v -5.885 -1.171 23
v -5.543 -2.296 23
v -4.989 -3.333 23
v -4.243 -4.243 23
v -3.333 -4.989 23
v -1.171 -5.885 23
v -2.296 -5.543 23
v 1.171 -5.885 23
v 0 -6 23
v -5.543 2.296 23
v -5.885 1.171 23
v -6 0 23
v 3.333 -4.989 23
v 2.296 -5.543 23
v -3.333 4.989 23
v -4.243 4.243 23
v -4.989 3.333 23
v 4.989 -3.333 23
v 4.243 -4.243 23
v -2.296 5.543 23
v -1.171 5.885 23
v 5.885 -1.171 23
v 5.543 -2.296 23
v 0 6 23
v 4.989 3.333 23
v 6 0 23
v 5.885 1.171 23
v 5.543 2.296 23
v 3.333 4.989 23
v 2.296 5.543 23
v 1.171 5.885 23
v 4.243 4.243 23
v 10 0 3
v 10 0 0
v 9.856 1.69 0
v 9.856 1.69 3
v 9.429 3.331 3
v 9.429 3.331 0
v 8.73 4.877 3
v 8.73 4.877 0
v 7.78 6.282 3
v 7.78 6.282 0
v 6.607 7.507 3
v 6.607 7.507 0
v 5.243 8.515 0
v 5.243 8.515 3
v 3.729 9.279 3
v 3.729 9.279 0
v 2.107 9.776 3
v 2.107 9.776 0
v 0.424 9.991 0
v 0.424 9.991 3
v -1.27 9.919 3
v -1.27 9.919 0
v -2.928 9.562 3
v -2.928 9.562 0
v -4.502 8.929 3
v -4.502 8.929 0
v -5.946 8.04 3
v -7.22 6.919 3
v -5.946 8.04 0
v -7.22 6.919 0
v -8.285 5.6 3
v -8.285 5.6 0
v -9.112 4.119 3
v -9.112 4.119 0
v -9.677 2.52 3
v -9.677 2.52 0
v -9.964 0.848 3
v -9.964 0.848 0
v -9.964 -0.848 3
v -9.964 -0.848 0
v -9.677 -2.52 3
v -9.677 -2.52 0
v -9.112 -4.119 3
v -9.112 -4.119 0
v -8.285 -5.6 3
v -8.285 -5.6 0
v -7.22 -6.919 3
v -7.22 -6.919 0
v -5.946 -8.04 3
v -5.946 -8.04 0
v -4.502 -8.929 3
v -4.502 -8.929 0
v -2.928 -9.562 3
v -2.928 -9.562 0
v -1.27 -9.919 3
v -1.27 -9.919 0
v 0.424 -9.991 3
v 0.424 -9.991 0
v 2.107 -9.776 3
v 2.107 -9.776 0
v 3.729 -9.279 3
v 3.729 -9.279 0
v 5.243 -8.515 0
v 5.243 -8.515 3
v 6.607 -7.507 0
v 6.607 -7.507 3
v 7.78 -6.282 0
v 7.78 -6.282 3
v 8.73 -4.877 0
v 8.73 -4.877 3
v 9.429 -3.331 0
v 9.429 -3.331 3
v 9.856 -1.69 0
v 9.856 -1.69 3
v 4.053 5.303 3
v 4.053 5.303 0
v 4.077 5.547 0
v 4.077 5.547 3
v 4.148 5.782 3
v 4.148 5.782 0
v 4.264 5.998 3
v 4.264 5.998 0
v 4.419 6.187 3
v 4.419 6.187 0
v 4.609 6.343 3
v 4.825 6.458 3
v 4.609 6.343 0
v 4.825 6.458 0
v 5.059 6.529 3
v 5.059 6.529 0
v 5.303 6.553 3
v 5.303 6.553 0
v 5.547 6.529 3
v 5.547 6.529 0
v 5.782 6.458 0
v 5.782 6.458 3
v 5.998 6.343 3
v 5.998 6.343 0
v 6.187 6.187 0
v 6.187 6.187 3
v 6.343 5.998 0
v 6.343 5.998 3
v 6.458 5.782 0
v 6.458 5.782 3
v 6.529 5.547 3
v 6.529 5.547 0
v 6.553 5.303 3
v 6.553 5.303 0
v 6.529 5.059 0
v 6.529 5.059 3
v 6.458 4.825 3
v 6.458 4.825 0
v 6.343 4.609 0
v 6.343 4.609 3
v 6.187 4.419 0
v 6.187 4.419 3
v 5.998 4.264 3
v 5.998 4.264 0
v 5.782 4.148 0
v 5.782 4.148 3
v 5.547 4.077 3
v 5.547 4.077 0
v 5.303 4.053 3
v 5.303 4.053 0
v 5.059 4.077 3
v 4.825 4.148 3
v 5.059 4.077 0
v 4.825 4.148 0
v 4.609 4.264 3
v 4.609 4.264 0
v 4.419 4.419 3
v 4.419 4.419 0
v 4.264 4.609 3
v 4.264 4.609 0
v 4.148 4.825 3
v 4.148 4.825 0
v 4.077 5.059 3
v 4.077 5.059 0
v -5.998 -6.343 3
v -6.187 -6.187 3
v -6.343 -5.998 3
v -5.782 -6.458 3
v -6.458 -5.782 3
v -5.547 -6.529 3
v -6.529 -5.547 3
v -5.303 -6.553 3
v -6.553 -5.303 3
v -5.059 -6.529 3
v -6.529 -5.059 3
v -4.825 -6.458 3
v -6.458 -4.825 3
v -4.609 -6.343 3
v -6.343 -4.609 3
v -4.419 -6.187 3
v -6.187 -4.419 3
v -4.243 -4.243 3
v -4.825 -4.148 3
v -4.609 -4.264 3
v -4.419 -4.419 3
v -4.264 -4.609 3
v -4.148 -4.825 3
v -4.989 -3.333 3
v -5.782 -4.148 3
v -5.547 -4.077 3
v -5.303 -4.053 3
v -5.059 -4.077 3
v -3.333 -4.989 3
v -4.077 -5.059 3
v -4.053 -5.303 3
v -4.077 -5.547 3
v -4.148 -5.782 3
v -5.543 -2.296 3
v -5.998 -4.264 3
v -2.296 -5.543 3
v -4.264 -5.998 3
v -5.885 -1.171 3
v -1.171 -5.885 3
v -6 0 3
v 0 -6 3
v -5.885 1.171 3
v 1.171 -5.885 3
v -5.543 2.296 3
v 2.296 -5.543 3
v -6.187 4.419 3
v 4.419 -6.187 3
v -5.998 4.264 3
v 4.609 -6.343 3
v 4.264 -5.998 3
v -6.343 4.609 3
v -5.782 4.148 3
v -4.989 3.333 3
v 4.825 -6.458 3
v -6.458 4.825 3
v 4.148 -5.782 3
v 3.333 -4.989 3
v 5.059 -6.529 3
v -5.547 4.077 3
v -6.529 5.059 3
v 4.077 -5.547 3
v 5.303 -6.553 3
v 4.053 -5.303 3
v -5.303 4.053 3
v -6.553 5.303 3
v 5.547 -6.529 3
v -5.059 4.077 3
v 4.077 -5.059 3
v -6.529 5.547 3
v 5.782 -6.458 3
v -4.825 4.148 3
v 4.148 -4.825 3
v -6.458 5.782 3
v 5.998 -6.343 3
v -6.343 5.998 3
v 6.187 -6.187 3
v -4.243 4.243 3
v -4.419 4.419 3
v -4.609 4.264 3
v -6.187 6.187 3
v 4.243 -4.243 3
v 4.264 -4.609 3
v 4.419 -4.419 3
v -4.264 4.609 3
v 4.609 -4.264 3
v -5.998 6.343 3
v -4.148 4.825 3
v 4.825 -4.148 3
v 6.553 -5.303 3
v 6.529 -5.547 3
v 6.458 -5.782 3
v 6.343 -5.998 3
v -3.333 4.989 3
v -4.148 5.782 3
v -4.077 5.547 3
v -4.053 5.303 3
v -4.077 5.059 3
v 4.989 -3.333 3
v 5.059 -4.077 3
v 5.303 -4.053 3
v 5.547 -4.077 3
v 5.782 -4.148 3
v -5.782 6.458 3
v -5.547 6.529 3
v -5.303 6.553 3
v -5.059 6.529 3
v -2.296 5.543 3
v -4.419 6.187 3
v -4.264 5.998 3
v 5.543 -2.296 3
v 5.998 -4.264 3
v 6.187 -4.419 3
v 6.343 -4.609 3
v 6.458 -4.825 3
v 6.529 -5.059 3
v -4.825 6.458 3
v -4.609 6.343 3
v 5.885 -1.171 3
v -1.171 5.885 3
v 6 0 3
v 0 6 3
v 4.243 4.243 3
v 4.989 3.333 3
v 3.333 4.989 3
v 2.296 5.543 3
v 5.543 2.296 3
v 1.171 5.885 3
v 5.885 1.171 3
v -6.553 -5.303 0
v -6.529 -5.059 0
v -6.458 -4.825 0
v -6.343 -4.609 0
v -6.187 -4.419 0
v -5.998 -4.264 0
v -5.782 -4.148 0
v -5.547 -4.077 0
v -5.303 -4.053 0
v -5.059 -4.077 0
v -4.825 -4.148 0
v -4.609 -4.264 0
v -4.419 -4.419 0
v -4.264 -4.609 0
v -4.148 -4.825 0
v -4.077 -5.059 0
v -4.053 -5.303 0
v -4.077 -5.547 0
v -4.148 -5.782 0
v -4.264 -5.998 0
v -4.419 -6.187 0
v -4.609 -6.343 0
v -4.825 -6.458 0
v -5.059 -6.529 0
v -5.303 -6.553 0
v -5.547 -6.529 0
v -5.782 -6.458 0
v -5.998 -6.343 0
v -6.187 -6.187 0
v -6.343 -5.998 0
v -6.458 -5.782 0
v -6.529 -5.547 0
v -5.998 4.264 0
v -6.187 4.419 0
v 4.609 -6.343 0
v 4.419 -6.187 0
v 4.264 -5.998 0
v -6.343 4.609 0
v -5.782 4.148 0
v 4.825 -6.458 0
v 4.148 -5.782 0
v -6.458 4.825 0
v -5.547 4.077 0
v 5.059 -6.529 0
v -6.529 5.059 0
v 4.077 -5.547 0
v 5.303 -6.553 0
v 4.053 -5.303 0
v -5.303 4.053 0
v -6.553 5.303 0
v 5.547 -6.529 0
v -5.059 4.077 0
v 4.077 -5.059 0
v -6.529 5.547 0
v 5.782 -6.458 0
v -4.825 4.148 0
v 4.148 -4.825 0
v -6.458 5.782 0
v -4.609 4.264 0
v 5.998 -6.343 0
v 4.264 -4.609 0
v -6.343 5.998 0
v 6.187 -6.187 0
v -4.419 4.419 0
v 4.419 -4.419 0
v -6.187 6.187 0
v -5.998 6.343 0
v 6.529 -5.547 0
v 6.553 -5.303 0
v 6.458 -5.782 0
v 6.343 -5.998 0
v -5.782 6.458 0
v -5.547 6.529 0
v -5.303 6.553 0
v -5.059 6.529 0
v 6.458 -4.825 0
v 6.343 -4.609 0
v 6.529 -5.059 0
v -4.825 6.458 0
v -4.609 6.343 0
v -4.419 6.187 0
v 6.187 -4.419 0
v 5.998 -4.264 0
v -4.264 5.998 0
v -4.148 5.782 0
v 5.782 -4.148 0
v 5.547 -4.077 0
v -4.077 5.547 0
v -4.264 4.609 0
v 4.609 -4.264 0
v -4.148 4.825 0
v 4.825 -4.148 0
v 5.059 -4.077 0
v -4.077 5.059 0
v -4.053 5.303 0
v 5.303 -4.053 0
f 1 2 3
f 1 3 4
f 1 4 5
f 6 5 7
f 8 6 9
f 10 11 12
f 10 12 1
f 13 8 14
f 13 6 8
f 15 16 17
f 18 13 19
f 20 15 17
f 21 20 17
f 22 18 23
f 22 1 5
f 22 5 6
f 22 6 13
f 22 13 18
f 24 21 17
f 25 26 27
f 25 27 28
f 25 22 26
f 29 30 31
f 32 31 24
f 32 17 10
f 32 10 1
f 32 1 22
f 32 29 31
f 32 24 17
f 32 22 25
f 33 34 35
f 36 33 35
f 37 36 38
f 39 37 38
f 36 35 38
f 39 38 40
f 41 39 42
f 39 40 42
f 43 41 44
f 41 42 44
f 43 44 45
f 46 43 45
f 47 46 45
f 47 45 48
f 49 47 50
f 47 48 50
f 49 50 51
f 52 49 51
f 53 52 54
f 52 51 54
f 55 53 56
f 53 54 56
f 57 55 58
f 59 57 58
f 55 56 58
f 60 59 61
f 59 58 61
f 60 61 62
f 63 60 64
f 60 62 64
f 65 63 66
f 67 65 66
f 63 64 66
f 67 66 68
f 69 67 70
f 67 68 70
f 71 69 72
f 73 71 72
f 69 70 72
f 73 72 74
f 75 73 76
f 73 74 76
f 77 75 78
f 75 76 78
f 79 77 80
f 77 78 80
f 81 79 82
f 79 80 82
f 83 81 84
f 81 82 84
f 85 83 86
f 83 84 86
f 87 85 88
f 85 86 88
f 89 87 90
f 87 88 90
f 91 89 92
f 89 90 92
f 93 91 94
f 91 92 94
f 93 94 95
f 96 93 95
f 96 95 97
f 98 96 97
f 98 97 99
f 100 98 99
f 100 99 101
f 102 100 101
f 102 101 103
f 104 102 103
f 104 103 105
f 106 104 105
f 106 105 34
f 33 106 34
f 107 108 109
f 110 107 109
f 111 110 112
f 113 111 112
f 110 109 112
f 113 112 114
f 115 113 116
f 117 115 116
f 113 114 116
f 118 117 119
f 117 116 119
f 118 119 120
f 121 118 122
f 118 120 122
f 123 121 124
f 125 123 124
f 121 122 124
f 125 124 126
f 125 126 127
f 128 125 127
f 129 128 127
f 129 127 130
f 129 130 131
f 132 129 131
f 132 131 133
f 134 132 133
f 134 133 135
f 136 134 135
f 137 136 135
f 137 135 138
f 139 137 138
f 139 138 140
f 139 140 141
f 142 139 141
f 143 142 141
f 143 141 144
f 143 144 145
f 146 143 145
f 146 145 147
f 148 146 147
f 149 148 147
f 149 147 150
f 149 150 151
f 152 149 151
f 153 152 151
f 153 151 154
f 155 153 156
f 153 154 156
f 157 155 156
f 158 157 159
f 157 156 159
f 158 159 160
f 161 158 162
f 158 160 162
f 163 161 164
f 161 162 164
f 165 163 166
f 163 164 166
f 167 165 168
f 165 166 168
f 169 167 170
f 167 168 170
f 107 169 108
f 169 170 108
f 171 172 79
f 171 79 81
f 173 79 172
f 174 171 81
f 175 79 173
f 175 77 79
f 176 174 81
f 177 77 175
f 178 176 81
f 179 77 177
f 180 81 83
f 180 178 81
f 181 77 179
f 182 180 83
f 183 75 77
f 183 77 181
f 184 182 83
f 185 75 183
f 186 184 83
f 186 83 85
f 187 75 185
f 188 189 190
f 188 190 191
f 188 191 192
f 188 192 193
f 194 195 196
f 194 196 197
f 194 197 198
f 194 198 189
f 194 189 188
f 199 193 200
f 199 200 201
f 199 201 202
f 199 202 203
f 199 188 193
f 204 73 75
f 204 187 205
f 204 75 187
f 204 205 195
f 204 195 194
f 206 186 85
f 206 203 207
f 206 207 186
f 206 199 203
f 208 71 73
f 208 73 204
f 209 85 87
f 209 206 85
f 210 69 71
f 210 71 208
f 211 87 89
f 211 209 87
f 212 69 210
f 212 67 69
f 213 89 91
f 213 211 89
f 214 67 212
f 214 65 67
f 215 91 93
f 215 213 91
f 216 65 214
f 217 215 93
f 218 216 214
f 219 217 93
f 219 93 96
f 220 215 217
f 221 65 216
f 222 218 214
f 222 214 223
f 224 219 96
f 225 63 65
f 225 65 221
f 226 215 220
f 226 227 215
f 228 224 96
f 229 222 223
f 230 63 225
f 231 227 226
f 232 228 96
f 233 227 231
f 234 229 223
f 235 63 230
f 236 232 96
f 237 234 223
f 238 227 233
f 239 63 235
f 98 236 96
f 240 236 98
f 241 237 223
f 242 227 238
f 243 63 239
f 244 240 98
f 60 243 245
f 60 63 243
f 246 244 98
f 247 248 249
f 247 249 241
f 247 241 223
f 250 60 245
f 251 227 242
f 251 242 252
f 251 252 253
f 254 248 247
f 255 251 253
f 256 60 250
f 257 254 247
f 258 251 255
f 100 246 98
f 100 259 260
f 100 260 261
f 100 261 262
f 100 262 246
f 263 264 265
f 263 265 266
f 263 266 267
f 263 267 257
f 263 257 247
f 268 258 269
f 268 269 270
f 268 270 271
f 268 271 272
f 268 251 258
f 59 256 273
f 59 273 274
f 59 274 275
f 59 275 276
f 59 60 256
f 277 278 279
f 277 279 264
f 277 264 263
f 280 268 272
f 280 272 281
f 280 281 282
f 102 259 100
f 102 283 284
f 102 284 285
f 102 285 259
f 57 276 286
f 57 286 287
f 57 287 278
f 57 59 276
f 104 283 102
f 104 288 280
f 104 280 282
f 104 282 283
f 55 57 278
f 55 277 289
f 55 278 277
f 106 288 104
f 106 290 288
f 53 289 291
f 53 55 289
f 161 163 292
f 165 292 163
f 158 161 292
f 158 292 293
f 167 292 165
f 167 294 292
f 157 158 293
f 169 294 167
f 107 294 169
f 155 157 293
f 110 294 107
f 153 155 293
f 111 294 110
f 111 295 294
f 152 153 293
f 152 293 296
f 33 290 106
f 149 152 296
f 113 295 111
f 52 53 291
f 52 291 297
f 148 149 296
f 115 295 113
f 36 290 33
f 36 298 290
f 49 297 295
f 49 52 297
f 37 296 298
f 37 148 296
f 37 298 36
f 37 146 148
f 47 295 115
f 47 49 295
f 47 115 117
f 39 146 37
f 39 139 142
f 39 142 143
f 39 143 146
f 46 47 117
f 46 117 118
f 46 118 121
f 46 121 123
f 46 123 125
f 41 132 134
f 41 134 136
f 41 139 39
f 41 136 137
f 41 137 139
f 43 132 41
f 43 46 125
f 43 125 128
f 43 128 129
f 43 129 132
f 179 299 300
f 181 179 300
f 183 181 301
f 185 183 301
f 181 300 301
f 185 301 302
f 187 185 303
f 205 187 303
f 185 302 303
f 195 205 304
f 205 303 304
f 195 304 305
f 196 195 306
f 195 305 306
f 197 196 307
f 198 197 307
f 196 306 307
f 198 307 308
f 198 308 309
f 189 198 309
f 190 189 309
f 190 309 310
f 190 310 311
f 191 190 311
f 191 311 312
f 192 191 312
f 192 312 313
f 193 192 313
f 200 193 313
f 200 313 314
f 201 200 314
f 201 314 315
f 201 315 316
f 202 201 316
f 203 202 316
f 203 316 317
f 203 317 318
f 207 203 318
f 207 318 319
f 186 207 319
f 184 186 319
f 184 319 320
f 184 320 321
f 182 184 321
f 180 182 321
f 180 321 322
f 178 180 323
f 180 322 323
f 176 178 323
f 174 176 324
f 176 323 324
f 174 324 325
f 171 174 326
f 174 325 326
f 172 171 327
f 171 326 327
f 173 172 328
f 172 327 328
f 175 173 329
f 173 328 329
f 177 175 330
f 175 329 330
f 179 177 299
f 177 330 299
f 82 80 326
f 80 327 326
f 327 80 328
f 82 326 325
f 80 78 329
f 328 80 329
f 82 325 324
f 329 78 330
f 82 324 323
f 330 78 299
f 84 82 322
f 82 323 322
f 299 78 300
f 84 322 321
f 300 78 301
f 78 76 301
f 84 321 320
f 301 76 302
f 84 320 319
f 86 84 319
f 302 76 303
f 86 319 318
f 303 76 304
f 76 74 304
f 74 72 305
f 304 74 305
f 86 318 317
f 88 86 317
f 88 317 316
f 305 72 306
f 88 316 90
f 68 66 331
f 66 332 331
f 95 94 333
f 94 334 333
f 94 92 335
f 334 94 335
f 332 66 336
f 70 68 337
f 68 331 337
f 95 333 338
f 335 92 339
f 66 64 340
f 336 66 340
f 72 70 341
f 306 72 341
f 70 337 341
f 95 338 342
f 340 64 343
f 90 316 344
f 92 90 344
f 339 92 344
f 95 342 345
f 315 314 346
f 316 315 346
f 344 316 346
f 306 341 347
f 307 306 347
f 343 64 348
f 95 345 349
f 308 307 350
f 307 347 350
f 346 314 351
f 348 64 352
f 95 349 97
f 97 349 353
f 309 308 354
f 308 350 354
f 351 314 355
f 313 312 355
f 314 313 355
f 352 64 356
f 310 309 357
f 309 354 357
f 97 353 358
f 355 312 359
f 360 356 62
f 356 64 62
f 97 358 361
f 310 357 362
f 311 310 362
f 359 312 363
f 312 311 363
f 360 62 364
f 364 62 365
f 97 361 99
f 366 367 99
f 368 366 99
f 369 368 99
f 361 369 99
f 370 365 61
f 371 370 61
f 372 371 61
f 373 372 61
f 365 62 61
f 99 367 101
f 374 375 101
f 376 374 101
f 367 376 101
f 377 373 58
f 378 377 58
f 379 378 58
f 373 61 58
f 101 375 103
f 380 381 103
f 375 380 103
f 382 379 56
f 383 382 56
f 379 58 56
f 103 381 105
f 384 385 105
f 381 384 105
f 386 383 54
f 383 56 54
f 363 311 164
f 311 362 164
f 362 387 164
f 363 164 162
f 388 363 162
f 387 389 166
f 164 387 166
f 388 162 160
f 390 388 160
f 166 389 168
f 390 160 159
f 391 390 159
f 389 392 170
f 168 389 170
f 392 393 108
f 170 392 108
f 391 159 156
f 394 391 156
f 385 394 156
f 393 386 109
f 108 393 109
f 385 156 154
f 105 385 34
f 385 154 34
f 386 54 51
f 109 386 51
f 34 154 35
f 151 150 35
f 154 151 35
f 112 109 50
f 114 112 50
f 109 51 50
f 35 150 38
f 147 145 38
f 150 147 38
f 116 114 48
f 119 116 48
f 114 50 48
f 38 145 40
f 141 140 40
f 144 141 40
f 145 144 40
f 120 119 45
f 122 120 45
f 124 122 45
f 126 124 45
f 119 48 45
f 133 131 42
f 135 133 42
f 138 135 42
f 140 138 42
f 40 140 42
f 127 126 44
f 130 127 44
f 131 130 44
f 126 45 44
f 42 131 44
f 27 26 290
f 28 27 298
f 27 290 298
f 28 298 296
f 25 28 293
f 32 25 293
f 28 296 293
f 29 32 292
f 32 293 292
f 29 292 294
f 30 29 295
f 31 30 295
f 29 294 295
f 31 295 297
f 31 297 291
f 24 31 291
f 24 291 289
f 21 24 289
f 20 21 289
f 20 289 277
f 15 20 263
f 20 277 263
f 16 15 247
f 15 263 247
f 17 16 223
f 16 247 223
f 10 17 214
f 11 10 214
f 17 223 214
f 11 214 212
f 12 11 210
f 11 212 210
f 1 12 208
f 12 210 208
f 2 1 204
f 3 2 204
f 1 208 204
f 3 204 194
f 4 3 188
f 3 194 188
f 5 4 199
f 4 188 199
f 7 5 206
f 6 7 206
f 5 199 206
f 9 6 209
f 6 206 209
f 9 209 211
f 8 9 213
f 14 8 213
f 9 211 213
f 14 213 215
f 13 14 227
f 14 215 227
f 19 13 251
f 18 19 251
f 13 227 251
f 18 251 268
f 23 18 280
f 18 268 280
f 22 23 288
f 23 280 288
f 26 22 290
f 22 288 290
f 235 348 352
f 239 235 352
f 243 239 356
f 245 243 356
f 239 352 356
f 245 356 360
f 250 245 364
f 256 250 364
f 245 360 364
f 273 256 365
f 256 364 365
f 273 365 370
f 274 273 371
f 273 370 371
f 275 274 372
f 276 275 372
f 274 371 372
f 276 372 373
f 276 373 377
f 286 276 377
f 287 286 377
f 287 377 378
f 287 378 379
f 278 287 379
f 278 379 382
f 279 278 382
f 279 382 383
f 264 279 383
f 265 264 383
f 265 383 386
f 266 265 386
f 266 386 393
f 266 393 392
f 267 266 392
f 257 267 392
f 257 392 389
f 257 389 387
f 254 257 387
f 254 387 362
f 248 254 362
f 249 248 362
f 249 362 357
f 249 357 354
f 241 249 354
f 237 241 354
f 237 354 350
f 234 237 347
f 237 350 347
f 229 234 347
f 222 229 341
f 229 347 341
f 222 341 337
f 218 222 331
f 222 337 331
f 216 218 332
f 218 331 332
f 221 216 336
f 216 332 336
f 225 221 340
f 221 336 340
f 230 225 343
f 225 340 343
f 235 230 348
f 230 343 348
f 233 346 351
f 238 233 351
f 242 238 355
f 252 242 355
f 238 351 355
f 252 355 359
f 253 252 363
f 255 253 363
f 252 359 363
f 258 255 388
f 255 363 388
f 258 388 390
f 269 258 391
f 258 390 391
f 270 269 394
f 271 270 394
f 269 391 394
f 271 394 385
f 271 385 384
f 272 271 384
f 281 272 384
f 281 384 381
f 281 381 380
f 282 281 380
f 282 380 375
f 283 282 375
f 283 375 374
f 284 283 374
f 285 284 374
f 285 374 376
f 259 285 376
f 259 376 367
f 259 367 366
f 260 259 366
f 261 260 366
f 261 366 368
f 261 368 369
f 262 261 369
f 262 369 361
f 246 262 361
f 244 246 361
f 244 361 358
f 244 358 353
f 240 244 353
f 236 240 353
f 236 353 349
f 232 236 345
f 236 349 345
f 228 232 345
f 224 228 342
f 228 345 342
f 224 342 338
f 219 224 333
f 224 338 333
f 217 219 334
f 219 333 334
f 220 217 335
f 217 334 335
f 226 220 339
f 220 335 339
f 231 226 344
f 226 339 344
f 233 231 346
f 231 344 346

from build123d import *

# Parameters (mm, degrees)
SKETCH_1_R          = 10
EXTRUDE_1_DEPTH     = 3
SKETCH_2_R          = 6
EXTRUDE_2_DEPTH     = 20
CUT_EXTRUDE_1_REACH = 29
SKETCH_4_R          = 1.25


with BuildPart() as part:
    # 草图1 → 凸台-拉伸1 (new body)
    with BuildSketch(Plane.XY):
        Circle(SKETCH_1_R)
    extrude(amount=EXTRUDE_1_DEPTH)

    # 草图2 → 凸台-拉伸2 (add)
    with BuildSketch(Plane.XY.offset(3)):
        Circle(SKETCH_2_R)
    extrude(amount=EXTRUDE_2_DEPTH)

    # 草图4 → 切除-拉伸1 (cut, up to next)
    with BuildSketch(Plane(origin=(0, 0, 0), x_dir=(-1, 0, 0), z_dir=(0, 0, -1)), mode=Mode.PRIVATE) as cut_extrude_1_sk1:
        with Locations((-5.303300859, 5.303300859)):
            Circle(SKETCH_4_R)
    cut_extrude_1_tool1 = extrude(cut_extrude_1_sk1.sketch, amount=-CUT_EXTRUDE_1_REACH, mode=Mode.PRIVATE) & part.part
    # 草图4 → 切除-拉伸1 (cut, up to next)
    with BuildSketch(Plane(origin=(0, 0, 0), x_dir=(-1, 0, 0), z_dir=(0, 0, -1)), mode=Mode.PRIVATE) as cut_extrude_1_sk2:
        with Locations((5.303300859, 5.303300859)):
            Circle(SKETCH_4_R)
    cut_extrude_1_tool2 = extrude(cut_extrude_1_sk2.sketch, amount=-CUT_EXTRUDE_1_REACH, mode=Mode.PRIVATE) & part.part
    # 草图4 → 切除-拉伸1 (cut, up to next)
    with BuildSketch(Plane(origin=(0, 0, 0), x_dir=(-1, 0, 0), z_dir=(0, 0, -1)), mode=Mode.PRIVATE) as cut_extrude_1_sk3:
        with Locations((5.303300859, -5.303300859)):
            Circle(SKETCH_4_R)
    cut_extrude_1_tool3 = extrude(cut_extrude_1_sk3.sketch, amount=-CUT_EXTRUDE_1_REACH, mode=Mode.PRIVATE) & part.part
    # 草图4 → 切除-拉伸1 (cut, up to next)
    with BuildSketch(Plane(origin=(0, 0, 0), x_dir=(-1, 0, 0), z_dir=(0, 0, -1)), mode=Mode.PRIVATE) as cut_extrude_1_sk4:
        with Locations((-5.303300859, -5.303300859)):
            Circle(SKETCH_4_R)
    cut_extrude_1_tool4 = extrude(cut_extrude_1_sk4.sketch, amount=-CUT_EXTRUDE_1_REACH, mode=Mode.PRIVATE) & part.part
    add(cut_extrude_1_tool1.solids().sort_by_distance((5.303301, 5.303301, 0))[0], mode=Mode.SUBTRACT)
    add(cut_extrude_1_tool2.solids().sort_by_distance((-5.303301, 5.303301, 0))[0], mode=Mode.SUBTRACT)
    add(cut_extrude_1_tool3.solids().sort_by_distance((-5.303301, -5.303301, 0))[0], mode=Mode.SUBTRACT)
    add(cut_extrude_1_tool4.solids().sort_by_distance((5.303301, -5.303301, 0))[0], mode=Mode.SUBTRACT)


solid = part.part
